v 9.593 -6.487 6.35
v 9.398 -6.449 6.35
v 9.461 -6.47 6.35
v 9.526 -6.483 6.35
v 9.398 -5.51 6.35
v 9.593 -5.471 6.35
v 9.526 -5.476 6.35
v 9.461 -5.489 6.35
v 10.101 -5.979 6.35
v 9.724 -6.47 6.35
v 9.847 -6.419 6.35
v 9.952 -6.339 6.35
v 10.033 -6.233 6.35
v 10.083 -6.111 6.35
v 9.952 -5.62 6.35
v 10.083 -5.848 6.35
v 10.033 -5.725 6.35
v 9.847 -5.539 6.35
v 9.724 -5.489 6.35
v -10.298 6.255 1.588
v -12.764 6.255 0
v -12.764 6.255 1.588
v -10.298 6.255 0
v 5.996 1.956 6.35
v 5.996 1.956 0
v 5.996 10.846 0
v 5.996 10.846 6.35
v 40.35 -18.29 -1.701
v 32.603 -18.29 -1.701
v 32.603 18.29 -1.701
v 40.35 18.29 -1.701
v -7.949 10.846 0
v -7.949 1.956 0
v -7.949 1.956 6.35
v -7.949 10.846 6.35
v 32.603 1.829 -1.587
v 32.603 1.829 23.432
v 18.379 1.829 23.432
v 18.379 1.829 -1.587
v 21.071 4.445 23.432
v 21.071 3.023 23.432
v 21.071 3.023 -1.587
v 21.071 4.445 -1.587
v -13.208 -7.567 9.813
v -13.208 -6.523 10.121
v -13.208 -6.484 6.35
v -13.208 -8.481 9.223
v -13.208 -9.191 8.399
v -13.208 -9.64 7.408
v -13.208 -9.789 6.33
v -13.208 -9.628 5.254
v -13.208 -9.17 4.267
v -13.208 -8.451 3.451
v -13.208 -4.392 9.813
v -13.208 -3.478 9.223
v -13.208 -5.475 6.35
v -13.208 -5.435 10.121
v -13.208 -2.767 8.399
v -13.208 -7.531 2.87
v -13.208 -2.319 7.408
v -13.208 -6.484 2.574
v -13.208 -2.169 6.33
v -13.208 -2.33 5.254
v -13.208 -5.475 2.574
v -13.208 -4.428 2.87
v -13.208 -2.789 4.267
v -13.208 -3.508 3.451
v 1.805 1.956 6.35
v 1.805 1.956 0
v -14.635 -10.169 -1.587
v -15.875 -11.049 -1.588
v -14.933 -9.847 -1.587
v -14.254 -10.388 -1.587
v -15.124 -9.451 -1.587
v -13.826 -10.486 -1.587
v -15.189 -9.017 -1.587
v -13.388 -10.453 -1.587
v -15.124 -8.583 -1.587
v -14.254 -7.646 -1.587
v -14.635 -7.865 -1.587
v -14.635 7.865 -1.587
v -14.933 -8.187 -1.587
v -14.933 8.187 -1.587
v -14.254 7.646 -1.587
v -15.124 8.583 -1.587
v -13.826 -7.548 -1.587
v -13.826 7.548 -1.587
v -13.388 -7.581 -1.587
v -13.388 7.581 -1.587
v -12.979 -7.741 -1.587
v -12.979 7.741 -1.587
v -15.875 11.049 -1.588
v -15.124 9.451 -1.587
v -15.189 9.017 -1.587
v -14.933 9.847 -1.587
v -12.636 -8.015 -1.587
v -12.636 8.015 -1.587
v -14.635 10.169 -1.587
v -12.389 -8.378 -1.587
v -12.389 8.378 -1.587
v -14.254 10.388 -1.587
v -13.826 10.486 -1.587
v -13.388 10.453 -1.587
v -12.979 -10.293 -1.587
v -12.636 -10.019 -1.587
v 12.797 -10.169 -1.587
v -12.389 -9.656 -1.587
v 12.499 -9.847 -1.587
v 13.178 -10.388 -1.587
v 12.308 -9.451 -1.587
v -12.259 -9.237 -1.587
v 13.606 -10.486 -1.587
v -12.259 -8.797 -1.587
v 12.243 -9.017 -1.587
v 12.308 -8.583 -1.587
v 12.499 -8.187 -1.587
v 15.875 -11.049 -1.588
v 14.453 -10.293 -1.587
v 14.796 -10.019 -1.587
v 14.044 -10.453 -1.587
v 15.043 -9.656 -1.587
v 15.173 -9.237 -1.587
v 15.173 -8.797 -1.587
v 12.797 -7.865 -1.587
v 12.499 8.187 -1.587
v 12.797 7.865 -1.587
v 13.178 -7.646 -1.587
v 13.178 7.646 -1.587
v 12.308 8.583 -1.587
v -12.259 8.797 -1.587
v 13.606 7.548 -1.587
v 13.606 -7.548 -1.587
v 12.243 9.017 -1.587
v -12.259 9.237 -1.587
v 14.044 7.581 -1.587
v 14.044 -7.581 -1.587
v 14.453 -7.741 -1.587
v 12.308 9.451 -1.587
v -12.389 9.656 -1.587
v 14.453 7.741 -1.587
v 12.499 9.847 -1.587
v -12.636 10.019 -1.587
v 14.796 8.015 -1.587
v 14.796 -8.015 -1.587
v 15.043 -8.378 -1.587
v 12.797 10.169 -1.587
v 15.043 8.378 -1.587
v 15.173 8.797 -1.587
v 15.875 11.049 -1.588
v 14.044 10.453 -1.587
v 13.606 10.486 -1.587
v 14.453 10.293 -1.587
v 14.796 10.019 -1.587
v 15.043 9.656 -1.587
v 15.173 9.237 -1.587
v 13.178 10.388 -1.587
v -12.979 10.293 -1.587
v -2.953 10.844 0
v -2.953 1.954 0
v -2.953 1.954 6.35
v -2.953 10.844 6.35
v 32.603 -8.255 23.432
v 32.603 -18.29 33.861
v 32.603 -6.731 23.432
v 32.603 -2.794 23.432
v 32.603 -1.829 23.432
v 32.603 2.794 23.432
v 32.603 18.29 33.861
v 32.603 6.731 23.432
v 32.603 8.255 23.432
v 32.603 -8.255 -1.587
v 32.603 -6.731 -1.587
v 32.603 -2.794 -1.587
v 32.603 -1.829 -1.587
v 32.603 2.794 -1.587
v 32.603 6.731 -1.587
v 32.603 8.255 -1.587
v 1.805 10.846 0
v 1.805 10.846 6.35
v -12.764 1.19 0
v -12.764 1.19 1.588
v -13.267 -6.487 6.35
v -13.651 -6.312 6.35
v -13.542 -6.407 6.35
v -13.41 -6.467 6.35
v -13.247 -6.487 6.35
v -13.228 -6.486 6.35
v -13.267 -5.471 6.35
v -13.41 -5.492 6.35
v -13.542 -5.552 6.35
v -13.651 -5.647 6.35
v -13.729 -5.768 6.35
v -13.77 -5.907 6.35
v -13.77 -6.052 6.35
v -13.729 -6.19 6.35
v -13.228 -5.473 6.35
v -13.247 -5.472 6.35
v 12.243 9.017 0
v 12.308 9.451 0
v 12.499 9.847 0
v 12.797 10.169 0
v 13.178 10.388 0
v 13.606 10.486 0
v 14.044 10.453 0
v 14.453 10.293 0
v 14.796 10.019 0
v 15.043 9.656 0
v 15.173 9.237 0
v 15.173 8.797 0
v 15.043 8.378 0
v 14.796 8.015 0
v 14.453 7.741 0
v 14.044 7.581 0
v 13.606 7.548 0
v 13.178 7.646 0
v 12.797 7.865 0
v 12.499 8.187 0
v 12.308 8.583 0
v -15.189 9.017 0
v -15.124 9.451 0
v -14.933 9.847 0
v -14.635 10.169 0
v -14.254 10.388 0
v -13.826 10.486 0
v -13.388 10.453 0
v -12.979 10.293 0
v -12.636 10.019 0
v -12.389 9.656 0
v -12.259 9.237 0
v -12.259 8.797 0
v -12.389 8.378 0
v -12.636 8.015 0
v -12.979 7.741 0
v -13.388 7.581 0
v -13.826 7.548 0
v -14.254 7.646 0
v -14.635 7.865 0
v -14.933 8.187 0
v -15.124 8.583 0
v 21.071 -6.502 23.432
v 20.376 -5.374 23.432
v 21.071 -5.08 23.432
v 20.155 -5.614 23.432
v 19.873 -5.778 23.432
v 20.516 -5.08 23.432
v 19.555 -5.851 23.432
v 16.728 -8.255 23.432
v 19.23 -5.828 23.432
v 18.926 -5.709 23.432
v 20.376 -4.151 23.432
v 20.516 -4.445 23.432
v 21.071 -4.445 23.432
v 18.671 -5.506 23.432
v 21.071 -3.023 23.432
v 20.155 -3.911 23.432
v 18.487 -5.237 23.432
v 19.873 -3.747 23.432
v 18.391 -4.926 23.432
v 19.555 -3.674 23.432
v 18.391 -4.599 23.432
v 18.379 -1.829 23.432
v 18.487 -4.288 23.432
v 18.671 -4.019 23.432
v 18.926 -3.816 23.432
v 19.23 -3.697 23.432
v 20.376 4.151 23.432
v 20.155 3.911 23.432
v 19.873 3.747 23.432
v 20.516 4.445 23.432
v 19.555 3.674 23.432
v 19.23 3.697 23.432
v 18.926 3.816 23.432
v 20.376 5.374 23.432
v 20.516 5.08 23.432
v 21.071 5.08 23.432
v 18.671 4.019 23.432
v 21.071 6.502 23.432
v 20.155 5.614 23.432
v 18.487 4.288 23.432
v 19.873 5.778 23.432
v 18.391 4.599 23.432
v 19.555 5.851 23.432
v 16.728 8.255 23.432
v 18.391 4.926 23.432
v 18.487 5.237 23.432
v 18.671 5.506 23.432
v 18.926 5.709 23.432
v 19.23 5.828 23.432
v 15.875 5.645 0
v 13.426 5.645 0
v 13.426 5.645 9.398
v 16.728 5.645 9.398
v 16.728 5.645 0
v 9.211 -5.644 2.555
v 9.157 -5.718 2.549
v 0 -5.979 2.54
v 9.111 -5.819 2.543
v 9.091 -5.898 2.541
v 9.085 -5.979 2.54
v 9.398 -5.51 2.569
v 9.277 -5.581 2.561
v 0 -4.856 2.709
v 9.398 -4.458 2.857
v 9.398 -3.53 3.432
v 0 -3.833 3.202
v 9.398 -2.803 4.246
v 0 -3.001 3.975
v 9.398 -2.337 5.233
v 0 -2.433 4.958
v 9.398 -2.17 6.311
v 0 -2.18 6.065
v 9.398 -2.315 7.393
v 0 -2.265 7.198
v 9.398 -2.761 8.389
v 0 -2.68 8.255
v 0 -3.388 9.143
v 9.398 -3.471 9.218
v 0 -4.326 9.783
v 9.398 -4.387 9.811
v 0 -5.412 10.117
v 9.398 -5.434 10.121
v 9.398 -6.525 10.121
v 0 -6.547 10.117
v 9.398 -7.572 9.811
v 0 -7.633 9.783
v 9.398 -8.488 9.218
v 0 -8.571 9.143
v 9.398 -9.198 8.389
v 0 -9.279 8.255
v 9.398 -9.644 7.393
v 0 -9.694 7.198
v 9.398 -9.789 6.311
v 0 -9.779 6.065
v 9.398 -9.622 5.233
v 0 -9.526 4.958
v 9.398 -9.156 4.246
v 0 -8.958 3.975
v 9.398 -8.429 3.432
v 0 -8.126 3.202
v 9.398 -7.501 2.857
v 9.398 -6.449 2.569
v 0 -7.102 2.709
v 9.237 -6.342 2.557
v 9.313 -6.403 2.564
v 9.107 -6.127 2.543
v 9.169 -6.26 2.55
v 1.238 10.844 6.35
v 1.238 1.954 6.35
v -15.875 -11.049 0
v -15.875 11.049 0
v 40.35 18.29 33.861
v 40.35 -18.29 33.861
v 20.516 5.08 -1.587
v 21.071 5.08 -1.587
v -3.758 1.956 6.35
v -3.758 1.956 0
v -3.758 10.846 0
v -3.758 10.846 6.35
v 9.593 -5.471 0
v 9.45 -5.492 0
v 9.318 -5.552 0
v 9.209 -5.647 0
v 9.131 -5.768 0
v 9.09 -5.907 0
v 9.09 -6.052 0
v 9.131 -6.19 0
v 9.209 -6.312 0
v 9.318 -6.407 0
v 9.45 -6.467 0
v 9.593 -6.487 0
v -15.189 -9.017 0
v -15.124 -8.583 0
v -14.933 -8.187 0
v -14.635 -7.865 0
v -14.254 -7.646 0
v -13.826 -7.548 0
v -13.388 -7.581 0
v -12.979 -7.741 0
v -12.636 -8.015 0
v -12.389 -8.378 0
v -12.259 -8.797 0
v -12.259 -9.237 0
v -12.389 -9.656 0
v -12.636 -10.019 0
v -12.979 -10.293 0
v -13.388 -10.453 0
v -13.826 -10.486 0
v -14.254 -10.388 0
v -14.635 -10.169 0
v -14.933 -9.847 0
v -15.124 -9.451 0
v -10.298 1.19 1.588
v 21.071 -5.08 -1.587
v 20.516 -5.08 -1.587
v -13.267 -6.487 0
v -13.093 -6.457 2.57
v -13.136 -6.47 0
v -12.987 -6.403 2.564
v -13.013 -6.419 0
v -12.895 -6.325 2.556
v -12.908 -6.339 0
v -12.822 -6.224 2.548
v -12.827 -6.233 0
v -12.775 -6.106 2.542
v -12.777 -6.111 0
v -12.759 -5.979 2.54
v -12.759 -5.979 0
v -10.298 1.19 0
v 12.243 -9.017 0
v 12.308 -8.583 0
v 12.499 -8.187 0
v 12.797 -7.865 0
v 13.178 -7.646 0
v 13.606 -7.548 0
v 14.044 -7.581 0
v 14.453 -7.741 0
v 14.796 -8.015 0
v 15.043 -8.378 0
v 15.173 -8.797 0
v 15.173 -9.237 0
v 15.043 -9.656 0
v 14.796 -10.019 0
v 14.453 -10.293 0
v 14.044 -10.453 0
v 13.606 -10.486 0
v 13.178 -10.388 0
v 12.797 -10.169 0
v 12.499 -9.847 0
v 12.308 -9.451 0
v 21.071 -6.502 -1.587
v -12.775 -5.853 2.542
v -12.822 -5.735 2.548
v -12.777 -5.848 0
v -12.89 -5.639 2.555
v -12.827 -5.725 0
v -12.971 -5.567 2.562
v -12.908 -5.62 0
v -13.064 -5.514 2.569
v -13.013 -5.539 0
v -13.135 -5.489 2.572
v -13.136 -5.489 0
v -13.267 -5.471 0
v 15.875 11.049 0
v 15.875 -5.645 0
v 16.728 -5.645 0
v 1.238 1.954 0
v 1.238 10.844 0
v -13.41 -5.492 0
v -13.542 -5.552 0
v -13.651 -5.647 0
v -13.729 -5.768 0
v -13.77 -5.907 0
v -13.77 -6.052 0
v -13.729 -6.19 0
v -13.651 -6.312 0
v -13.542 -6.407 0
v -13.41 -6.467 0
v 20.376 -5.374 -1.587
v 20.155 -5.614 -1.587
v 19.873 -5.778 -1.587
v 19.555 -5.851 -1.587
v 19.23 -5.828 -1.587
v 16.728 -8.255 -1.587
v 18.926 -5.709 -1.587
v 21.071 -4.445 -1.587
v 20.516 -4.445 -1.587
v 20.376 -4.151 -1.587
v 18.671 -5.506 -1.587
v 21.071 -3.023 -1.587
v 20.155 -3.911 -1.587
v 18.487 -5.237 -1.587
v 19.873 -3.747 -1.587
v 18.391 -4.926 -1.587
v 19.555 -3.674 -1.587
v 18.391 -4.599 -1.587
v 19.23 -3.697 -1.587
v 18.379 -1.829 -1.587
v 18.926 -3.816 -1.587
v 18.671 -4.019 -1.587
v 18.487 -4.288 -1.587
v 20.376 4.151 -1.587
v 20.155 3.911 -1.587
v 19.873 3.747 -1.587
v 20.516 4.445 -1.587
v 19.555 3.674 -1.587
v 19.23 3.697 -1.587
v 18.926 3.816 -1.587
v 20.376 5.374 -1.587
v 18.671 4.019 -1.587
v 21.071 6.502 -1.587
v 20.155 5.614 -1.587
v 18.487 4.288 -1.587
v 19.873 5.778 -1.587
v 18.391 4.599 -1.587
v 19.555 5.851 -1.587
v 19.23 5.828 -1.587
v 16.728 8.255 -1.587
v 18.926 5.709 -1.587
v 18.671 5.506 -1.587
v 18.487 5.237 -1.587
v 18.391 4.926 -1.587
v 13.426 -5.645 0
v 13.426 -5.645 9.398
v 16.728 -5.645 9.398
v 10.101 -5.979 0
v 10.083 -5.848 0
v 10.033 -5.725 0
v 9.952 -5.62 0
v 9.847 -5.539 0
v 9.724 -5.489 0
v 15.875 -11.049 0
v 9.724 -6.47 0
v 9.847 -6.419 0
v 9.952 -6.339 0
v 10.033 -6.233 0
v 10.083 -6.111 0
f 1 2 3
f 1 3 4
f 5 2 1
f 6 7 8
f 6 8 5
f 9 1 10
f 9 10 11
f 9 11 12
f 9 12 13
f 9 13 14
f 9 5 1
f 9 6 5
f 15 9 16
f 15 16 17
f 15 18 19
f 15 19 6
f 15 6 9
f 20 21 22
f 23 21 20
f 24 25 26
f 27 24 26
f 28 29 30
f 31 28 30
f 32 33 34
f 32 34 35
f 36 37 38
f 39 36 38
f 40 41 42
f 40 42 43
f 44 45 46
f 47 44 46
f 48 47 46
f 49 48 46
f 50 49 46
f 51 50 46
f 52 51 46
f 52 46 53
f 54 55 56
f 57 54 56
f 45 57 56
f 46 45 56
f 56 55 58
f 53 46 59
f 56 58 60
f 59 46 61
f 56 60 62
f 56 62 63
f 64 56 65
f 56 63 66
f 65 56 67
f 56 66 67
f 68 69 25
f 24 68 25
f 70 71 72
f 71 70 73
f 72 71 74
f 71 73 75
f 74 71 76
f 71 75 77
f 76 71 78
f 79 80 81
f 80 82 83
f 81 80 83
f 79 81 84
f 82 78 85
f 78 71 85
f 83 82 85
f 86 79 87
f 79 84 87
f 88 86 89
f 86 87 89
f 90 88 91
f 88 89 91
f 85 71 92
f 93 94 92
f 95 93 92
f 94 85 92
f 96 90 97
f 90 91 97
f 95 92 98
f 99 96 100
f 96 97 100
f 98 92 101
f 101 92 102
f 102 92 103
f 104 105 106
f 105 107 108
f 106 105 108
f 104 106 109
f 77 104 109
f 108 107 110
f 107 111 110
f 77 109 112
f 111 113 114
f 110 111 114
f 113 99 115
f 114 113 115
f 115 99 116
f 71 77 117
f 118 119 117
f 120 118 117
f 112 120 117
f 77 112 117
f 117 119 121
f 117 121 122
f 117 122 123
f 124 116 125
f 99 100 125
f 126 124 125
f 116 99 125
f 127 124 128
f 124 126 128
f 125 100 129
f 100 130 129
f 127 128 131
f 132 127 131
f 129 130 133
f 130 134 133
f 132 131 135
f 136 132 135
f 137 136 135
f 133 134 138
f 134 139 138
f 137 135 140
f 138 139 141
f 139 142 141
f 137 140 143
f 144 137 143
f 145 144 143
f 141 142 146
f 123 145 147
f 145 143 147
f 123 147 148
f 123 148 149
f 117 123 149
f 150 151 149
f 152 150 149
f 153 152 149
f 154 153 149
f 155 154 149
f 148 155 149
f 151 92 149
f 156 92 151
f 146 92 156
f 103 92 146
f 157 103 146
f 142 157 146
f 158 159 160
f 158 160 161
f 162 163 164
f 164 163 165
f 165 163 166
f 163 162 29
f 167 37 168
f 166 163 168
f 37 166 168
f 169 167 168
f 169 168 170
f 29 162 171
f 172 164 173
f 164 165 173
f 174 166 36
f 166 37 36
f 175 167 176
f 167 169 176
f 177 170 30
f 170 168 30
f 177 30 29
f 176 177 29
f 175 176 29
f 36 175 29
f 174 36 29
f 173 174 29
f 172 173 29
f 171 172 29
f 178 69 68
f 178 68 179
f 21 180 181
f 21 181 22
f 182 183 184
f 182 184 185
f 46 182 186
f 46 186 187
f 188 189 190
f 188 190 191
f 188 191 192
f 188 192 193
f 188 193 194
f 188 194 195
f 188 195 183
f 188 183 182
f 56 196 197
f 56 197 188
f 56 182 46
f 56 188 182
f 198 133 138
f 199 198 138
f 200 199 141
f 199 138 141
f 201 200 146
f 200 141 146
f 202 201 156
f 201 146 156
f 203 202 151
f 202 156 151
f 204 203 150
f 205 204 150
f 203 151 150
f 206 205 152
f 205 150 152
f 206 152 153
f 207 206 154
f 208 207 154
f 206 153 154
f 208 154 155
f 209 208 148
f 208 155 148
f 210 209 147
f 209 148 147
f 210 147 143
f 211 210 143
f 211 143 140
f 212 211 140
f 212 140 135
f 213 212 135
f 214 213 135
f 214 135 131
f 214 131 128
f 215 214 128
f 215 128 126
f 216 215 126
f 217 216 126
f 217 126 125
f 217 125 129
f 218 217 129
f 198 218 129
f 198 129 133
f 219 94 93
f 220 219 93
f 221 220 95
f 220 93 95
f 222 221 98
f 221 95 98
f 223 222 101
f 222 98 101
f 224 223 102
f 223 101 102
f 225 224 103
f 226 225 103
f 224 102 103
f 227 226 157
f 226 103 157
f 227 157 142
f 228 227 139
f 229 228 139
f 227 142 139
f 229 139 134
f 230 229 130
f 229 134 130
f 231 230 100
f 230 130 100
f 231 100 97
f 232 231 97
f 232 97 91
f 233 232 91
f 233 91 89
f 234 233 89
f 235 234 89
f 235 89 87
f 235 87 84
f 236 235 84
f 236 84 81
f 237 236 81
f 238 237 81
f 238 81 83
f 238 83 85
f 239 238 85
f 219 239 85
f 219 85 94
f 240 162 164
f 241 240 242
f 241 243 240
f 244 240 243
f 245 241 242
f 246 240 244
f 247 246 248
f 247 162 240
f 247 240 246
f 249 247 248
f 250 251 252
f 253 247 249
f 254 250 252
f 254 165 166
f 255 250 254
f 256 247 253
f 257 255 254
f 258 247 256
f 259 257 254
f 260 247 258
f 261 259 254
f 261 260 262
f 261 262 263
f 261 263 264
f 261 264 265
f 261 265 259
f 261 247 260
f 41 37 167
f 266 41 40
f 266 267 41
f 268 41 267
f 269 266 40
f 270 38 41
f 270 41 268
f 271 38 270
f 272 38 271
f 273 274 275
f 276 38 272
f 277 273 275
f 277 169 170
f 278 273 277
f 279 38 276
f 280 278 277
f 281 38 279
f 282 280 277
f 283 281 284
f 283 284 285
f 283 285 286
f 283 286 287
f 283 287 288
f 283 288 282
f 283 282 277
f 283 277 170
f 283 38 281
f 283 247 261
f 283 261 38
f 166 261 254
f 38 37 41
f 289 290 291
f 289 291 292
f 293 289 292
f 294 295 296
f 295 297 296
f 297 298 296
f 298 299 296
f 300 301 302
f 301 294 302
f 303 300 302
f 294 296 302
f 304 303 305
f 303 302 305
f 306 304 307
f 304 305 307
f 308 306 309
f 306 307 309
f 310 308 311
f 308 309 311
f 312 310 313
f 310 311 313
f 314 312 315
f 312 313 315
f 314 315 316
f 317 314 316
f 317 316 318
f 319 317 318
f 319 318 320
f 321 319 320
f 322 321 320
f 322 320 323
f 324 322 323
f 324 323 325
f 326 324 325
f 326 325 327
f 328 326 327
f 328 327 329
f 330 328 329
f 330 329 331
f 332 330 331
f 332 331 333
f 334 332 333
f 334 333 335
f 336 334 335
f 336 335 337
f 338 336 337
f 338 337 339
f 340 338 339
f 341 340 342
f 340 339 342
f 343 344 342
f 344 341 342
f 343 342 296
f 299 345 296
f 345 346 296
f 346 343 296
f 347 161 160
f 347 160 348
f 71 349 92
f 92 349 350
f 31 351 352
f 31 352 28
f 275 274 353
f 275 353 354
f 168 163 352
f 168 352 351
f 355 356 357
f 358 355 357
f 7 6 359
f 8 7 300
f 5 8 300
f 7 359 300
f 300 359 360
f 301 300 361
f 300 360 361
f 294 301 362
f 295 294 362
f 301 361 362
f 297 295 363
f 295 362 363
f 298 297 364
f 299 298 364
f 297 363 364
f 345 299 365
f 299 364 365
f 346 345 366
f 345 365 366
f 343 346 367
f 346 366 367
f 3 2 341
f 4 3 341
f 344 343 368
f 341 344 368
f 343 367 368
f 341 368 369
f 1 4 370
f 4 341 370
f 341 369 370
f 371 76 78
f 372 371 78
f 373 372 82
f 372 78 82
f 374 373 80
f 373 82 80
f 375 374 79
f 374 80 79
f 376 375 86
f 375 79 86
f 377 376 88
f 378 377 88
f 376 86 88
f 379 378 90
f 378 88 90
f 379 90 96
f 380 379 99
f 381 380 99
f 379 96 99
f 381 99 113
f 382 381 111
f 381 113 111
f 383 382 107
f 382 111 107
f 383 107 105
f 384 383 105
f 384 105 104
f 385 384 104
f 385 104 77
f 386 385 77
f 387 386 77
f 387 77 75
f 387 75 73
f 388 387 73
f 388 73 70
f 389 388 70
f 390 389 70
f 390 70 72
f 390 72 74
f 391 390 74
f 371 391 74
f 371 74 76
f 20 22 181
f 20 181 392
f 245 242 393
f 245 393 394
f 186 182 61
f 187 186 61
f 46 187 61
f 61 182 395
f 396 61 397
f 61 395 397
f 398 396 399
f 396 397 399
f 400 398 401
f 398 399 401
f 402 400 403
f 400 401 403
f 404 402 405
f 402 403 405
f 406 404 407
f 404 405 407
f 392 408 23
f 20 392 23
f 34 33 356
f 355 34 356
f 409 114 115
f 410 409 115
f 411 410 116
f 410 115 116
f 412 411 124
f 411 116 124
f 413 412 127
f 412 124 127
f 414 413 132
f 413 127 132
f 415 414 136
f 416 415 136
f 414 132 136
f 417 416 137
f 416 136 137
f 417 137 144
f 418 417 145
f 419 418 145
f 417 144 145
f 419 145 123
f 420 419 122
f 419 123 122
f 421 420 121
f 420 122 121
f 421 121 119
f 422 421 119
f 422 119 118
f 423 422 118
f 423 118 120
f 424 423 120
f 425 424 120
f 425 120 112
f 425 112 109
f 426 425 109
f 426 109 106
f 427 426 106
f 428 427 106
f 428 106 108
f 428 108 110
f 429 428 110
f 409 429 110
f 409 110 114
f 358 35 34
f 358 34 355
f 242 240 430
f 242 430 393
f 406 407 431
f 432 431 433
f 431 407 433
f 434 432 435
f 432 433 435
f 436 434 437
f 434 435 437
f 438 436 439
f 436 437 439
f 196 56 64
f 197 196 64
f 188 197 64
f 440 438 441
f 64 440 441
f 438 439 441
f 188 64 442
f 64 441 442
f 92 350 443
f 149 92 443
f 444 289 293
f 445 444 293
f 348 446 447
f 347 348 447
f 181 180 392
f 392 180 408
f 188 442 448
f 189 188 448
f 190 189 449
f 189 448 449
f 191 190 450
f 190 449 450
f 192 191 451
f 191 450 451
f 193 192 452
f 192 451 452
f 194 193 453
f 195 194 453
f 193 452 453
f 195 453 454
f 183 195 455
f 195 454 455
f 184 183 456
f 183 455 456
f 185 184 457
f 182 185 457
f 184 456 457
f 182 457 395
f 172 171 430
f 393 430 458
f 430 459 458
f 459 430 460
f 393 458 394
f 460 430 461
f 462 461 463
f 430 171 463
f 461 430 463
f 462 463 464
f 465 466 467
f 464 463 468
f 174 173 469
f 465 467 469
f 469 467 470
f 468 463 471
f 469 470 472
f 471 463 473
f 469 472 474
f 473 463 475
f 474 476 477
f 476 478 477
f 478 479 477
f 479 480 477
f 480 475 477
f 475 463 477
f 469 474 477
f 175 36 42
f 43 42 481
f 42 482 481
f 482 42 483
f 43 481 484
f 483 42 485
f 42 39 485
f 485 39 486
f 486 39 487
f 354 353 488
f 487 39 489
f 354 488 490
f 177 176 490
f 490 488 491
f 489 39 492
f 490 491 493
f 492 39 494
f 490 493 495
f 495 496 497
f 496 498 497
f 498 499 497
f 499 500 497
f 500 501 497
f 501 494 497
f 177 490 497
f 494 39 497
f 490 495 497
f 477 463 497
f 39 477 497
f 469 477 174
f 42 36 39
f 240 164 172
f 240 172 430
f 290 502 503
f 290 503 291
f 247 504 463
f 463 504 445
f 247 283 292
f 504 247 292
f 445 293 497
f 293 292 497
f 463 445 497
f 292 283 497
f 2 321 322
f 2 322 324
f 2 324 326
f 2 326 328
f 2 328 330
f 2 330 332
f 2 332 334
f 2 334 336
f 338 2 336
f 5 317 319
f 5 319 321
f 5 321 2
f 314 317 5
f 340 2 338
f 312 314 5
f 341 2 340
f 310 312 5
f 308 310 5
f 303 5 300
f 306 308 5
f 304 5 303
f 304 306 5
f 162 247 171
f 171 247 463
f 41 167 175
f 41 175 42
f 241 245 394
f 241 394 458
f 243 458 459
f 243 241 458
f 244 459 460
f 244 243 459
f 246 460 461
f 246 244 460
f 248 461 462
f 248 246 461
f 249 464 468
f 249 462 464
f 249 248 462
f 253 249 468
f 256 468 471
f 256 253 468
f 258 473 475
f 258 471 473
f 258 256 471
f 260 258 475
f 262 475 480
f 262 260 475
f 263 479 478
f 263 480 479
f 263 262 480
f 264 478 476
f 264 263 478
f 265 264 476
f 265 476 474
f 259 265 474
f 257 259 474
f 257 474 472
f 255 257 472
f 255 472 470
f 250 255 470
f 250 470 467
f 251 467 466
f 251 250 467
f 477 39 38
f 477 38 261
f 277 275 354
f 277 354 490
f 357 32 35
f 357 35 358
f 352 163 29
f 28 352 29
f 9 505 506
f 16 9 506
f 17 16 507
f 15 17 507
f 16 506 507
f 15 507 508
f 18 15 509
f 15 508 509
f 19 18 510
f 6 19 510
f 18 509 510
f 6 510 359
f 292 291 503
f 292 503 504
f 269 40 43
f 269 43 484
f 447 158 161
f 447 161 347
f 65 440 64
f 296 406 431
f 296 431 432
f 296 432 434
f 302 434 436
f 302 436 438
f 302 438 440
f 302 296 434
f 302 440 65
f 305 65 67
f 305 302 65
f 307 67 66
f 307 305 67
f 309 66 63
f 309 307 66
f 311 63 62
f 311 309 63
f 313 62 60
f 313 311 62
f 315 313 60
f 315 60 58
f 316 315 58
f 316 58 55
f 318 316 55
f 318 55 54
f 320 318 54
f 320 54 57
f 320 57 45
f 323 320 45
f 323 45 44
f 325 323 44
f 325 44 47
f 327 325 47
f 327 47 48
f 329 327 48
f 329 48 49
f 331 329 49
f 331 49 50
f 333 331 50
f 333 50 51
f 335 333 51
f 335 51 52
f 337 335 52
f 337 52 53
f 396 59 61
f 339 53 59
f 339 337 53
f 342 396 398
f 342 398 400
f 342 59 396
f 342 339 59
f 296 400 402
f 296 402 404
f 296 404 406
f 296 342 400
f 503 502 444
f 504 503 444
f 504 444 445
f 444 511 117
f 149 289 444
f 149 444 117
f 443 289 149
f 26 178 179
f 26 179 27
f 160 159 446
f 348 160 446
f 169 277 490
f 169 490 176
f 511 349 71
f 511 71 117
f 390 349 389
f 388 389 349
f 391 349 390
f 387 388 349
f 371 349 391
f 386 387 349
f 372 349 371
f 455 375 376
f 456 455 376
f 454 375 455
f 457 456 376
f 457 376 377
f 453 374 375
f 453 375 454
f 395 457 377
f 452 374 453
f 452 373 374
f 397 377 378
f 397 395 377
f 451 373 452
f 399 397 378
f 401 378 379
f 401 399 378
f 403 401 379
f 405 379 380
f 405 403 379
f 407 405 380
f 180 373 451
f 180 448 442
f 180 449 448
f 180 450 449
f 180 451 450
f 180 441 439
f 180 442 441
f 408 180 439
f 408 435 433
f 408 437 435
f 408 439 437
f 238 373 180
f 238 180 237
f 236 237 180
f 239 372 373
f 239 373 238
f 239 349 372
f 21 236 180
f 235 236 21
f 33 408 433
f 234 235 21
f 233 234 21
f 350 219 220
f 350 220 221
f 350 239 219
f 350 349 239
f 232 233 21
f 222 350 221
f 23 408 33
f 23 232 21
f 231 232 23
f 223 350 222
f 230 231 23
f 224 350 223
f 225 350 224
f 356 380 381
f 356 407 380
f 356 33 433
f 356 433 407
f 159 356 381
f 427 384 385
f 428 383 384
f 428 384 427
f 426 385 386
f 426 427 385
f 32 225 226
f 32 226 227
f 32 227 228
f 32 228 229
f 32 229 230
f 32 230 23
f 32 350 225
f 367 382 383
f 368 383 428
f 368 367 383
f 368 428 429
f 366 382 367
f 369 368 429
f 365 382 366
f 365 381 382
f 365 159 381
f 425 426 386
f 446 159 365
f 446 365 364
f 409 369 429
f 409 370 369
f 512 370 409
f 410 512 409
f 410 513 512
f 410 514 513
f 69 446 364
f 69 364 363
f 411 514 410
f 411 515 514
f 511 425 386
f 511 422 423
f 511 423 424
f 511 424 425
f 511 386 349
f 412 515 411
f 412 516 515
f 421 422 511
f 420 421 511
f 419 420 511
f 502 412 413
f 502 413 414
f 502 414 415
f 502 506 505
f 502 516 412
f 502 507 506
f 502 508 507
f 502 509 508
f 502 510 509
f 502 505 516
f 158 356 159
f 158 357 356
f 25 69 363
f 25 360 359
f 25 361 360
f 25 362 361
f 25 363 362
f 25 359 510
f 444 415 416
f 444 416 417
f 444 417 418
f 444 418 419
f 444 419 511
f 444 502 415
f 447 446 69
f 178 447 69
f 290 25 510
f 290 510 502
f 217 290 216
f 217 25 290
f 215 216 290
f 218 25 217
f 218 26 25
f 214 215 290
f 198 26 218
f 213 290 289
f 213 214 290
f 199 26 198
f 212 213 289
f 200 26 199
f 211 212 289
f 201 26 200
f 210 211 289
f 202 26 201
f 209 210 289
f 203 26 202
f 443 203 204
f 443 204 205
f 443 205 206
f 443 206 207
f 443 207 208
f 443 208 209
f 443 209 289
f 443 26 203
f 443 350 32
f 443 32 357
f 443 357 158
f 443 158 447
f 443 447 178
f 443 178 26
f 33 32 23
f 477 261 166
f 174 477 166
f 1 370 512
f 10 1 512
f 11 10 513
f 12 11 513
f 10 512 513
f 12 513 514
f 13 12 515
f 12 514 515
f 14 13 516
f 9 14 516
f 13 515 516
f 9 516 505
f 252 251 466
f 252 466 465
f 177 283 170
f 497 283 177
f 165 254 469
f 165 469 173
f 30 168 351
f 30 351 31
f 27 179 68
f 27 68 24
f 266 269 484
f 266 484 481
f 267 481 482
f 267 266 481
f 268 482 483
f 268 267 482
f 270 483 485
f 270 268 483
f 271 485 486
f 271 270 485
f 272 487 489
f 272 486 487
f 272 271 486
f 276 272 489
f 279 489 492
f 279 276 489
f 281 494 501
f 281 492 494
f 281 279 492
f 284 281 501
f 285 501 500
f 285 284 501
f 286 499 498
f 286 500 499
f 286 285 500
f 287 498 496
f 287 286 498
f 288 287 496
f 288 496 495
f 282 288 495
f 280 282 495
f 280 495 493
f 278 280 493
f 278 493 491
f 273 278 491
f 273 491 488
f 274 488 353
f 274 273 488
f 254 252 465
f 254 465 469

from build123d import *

# Parameters (mm, degrees)
SKETCH1_W                       = 31.75
SKETCH1_H                       = 22.098
BOSS_EXTRUDE1_DEPTH             = 1.5875
F_32_0_116_DIAMETER_HOLE1_D     = 2.9464
F_32_0_116_DIAMETER_HOLE1_DEPTH = 25.4
F_32_0_116_DIAMETER_HOLE1_TIP   = 0.885187864
SKETCH4_W                       = 4.191
SKETCH4_H                       = 8.89
BOSS_EXTRUDE2_DEPTH             = 6.35
SKETCH4_3_W                     = 2.466272753
SKETCH4_3_H                     = 5.065857547
BOSS_EXTRUDE3_DEPTH             = 1.5875
SKETCH4_4_R                     = 0.508
BOSS_EXTRUDE4_DEPTH             = 6.35
BOSS_EXTRUDE5_DEPTH             = 9.398
BOSS_EXTRUDE5_DEPTH_BACK        = 13.208
SKETCH5_R                       = 3.81
SKETCH6_W                       = 3.302
SKETCH6_H                       = 11.289974084
BOSS_EXTRUDE6_DEPTH             = 9.398
SKETCH8_W                       = 25.019
SKETCH8_H                       = 16.51
BOSS_EXTRUDE7_DEPTH             = 15.875
SKETCH9_W                       = 14.224
SKETCH9_H                       = 3.6576
CUT_EXTRUDE1_DEPTH              = 43.555420887
SKETCH10_W                      = 35.562788841
SKETCH10_H                      = 36.580807606
BOSS_EXTRUDE8_DEPTH             = 7.747


with BuildPart() as part:
    # Sketch1 → Boss-Extrude1 (new body)
    with BuildSketch(Plane.XY):
        Rectangle(SKETCH1_W, SKETCH1_H)
    extrude(amount=-BOSS_EXTRUDE1_DEPTH)

    # #32 (0.116) Diameter Hole1
    with Locations(Plane.XY):
        with Locations((-13.716, 9.017), (13.716, -9.017), (13.716, 9.017), (-13.716, -9.017)):
            Hole(F_32_0_116_DIAMETER_HOLE1_D / 2, depth=F_32_0_116_DIAMETER_HOLE1_DEPTH)
            with Locations((0, 0, -(F_32_0_116_DIAMETER_HOLE1_DEPTH + F_32_0_116_DIAMETER_HOLE1_TIP / 2))):  # 118° drill point
                Cone(0, F_32_0_116_DIAMETER_HOLE1_D / 2, F_32_0_116_DIAMETER_HOLE1_TIP, mode=Mode.SUBTRACT)

    # Sketch4 → Boss-Extrude2 (add)
    with BuildSketch(Plane.XY):
        with Locations((-0.857280044, 6.398532258)):
            Rectangle(SKETCH4_W, SKETCH4_H)
        with Locations((-5.853947096, 6.4008)):
            Rectangle(SKETCH4_W, SKETCH4_H)
        with Locations((3.90076693, 6.4008)):
            Rectangle(SKETCH4_W, SKETCH4_H)
    extrude(amount=BOSS_EXTRUDE2_DEPTH)

    # Sketch4<3> → Boss-Extrude3 (add)
    with BuildSketch(Plane.XY):
        with Locations((-11.531344325, 3.722546838)):
            Rectangle(SKETCH4_3_W, SKETCH4_3_H)
    extrude(amount=BOSS_EXTRUDE3_DEPTH)

    # Sketch4<4> → Boss-Extrude4 (add)
    with BuildSketch(Plane.XY):
        with Locations((9.592700785, -5.979435424)):
            Circle(SKETCH4_4_R)
        with Locations((-13.267299215, -5.979435424)):
            Circle(SKETCH4_4_R)
    extrude(amount=BOSS_EXTRUDE4_DEPTH)

    # Sketch5 → Boss-Extrude5 (add, two sides: drawn at the far end of the back side and taken through both)
    with BuildSketch(Plane(origin=(0, 0, 0), x_dir=(0, 0, -1), z_dir=(1, 0, 0)).offset(-BOSS_EXTRUDE5_DEPTH_BACK)):
        with Locations((-6.35, -5.979435424)):
            Circle(SKETCH5_R)
    extrude(amount=BOSS_EXTRUDE5_DEPTH + BOSS_EXTRUDE5_DEPTH_BACK)

    # Sketch6 → Boss-Extrude6 (add)
    with BuildSketch(Plane.XY):
        with Locations((15.076654567, 0)):
            Rectangle(SKETCH6_W, SKETCH6_H)
    extrude(amount=BOSS_EXTRUDE6_DEPTH)

    # Sketch8 → Boss-Extrude7 (add)
    with BuildSketch(Plane(origin=(16.727654567, 0, 0), x_dir=(0, 0, -1), z_dir=(1, 0, 0))):
        with Locations((-10.922, 0)):
            Rectangle(SKETCH8_W, SKETCH8_H)
    extrude(amount=BOSS_EXTRUDE7_DEPTH)

    # Sketch9 → Cut-Extrude1 (cut, through all)
    with BuildSketch(Plane.XY.offset(23.4315)):
        with BuildLine():
            Line((21.071054567, 3.0226), (32.602654567, 2.794))
            Line((32.602654567, 2.794), (32.602654567, 6.731))
            Line((32.602654567, 6.731), (21.071054567, 6.5024))
            Line((21.071054567, 6.5024), (21.071054567, 5.08))
            Line((21.071054567, 5.08), (20.515887863, 5.08))
            ThreePointArc((20.515887863, 5.08), (18.378654567, 4.7625), (20.515887863, 4.445))
            Line((20.515887863, 4.445), (21.071054567, 4.445))
            Line((21.071054567, 4.445), (21.071054567, 3.0226))
        make_face()
        with BuildLine():
            Line((32.602654567, -6.731), (32.602654567, -2.794))
            Line((32.602654567, -2.794), (21.071054567, -3.0226))
            Line((21.071054567, -3.0226), (21.071054567, -4.445))
            Line((21.071054567, -4.445), (20.515887863, -4.445))
            ThreePointArc((20.515887863, -4.445), (18.378654567, -4.7625), (20.515887863, -5.08))
            Line((20.515887863, -5.08), (21.071054567, -5.08))
            Line((21.071054567, -5.08), (21.071054567, -6.5024))
            Line((21.071054567, -6.5024), (32.602654567, -6.731))
        make_face()
        with Locations((25.490654567, 0)):
            Rectangle(SKETCH9_W, SKETCH9_H)
    extrude(amount=-CUT_EXTRUDE1_DEPTH, mode=Mode.SUBTRACT)

    # Sketch10 → Boss-Extrude8 (add)
    with BuildSketch(Plane(origin=(32.602654567, 0, 0), x_dir=(0, 0, -1), z_dir=(1, 0, 0))):
        with Locations((-16.07996174, 0)):
            Rectangle(SKETCH10_W, SKETCH10_H)
    extrude(amount=BOSS_EXTRUDE8_DEPTH)


solid = part.part
